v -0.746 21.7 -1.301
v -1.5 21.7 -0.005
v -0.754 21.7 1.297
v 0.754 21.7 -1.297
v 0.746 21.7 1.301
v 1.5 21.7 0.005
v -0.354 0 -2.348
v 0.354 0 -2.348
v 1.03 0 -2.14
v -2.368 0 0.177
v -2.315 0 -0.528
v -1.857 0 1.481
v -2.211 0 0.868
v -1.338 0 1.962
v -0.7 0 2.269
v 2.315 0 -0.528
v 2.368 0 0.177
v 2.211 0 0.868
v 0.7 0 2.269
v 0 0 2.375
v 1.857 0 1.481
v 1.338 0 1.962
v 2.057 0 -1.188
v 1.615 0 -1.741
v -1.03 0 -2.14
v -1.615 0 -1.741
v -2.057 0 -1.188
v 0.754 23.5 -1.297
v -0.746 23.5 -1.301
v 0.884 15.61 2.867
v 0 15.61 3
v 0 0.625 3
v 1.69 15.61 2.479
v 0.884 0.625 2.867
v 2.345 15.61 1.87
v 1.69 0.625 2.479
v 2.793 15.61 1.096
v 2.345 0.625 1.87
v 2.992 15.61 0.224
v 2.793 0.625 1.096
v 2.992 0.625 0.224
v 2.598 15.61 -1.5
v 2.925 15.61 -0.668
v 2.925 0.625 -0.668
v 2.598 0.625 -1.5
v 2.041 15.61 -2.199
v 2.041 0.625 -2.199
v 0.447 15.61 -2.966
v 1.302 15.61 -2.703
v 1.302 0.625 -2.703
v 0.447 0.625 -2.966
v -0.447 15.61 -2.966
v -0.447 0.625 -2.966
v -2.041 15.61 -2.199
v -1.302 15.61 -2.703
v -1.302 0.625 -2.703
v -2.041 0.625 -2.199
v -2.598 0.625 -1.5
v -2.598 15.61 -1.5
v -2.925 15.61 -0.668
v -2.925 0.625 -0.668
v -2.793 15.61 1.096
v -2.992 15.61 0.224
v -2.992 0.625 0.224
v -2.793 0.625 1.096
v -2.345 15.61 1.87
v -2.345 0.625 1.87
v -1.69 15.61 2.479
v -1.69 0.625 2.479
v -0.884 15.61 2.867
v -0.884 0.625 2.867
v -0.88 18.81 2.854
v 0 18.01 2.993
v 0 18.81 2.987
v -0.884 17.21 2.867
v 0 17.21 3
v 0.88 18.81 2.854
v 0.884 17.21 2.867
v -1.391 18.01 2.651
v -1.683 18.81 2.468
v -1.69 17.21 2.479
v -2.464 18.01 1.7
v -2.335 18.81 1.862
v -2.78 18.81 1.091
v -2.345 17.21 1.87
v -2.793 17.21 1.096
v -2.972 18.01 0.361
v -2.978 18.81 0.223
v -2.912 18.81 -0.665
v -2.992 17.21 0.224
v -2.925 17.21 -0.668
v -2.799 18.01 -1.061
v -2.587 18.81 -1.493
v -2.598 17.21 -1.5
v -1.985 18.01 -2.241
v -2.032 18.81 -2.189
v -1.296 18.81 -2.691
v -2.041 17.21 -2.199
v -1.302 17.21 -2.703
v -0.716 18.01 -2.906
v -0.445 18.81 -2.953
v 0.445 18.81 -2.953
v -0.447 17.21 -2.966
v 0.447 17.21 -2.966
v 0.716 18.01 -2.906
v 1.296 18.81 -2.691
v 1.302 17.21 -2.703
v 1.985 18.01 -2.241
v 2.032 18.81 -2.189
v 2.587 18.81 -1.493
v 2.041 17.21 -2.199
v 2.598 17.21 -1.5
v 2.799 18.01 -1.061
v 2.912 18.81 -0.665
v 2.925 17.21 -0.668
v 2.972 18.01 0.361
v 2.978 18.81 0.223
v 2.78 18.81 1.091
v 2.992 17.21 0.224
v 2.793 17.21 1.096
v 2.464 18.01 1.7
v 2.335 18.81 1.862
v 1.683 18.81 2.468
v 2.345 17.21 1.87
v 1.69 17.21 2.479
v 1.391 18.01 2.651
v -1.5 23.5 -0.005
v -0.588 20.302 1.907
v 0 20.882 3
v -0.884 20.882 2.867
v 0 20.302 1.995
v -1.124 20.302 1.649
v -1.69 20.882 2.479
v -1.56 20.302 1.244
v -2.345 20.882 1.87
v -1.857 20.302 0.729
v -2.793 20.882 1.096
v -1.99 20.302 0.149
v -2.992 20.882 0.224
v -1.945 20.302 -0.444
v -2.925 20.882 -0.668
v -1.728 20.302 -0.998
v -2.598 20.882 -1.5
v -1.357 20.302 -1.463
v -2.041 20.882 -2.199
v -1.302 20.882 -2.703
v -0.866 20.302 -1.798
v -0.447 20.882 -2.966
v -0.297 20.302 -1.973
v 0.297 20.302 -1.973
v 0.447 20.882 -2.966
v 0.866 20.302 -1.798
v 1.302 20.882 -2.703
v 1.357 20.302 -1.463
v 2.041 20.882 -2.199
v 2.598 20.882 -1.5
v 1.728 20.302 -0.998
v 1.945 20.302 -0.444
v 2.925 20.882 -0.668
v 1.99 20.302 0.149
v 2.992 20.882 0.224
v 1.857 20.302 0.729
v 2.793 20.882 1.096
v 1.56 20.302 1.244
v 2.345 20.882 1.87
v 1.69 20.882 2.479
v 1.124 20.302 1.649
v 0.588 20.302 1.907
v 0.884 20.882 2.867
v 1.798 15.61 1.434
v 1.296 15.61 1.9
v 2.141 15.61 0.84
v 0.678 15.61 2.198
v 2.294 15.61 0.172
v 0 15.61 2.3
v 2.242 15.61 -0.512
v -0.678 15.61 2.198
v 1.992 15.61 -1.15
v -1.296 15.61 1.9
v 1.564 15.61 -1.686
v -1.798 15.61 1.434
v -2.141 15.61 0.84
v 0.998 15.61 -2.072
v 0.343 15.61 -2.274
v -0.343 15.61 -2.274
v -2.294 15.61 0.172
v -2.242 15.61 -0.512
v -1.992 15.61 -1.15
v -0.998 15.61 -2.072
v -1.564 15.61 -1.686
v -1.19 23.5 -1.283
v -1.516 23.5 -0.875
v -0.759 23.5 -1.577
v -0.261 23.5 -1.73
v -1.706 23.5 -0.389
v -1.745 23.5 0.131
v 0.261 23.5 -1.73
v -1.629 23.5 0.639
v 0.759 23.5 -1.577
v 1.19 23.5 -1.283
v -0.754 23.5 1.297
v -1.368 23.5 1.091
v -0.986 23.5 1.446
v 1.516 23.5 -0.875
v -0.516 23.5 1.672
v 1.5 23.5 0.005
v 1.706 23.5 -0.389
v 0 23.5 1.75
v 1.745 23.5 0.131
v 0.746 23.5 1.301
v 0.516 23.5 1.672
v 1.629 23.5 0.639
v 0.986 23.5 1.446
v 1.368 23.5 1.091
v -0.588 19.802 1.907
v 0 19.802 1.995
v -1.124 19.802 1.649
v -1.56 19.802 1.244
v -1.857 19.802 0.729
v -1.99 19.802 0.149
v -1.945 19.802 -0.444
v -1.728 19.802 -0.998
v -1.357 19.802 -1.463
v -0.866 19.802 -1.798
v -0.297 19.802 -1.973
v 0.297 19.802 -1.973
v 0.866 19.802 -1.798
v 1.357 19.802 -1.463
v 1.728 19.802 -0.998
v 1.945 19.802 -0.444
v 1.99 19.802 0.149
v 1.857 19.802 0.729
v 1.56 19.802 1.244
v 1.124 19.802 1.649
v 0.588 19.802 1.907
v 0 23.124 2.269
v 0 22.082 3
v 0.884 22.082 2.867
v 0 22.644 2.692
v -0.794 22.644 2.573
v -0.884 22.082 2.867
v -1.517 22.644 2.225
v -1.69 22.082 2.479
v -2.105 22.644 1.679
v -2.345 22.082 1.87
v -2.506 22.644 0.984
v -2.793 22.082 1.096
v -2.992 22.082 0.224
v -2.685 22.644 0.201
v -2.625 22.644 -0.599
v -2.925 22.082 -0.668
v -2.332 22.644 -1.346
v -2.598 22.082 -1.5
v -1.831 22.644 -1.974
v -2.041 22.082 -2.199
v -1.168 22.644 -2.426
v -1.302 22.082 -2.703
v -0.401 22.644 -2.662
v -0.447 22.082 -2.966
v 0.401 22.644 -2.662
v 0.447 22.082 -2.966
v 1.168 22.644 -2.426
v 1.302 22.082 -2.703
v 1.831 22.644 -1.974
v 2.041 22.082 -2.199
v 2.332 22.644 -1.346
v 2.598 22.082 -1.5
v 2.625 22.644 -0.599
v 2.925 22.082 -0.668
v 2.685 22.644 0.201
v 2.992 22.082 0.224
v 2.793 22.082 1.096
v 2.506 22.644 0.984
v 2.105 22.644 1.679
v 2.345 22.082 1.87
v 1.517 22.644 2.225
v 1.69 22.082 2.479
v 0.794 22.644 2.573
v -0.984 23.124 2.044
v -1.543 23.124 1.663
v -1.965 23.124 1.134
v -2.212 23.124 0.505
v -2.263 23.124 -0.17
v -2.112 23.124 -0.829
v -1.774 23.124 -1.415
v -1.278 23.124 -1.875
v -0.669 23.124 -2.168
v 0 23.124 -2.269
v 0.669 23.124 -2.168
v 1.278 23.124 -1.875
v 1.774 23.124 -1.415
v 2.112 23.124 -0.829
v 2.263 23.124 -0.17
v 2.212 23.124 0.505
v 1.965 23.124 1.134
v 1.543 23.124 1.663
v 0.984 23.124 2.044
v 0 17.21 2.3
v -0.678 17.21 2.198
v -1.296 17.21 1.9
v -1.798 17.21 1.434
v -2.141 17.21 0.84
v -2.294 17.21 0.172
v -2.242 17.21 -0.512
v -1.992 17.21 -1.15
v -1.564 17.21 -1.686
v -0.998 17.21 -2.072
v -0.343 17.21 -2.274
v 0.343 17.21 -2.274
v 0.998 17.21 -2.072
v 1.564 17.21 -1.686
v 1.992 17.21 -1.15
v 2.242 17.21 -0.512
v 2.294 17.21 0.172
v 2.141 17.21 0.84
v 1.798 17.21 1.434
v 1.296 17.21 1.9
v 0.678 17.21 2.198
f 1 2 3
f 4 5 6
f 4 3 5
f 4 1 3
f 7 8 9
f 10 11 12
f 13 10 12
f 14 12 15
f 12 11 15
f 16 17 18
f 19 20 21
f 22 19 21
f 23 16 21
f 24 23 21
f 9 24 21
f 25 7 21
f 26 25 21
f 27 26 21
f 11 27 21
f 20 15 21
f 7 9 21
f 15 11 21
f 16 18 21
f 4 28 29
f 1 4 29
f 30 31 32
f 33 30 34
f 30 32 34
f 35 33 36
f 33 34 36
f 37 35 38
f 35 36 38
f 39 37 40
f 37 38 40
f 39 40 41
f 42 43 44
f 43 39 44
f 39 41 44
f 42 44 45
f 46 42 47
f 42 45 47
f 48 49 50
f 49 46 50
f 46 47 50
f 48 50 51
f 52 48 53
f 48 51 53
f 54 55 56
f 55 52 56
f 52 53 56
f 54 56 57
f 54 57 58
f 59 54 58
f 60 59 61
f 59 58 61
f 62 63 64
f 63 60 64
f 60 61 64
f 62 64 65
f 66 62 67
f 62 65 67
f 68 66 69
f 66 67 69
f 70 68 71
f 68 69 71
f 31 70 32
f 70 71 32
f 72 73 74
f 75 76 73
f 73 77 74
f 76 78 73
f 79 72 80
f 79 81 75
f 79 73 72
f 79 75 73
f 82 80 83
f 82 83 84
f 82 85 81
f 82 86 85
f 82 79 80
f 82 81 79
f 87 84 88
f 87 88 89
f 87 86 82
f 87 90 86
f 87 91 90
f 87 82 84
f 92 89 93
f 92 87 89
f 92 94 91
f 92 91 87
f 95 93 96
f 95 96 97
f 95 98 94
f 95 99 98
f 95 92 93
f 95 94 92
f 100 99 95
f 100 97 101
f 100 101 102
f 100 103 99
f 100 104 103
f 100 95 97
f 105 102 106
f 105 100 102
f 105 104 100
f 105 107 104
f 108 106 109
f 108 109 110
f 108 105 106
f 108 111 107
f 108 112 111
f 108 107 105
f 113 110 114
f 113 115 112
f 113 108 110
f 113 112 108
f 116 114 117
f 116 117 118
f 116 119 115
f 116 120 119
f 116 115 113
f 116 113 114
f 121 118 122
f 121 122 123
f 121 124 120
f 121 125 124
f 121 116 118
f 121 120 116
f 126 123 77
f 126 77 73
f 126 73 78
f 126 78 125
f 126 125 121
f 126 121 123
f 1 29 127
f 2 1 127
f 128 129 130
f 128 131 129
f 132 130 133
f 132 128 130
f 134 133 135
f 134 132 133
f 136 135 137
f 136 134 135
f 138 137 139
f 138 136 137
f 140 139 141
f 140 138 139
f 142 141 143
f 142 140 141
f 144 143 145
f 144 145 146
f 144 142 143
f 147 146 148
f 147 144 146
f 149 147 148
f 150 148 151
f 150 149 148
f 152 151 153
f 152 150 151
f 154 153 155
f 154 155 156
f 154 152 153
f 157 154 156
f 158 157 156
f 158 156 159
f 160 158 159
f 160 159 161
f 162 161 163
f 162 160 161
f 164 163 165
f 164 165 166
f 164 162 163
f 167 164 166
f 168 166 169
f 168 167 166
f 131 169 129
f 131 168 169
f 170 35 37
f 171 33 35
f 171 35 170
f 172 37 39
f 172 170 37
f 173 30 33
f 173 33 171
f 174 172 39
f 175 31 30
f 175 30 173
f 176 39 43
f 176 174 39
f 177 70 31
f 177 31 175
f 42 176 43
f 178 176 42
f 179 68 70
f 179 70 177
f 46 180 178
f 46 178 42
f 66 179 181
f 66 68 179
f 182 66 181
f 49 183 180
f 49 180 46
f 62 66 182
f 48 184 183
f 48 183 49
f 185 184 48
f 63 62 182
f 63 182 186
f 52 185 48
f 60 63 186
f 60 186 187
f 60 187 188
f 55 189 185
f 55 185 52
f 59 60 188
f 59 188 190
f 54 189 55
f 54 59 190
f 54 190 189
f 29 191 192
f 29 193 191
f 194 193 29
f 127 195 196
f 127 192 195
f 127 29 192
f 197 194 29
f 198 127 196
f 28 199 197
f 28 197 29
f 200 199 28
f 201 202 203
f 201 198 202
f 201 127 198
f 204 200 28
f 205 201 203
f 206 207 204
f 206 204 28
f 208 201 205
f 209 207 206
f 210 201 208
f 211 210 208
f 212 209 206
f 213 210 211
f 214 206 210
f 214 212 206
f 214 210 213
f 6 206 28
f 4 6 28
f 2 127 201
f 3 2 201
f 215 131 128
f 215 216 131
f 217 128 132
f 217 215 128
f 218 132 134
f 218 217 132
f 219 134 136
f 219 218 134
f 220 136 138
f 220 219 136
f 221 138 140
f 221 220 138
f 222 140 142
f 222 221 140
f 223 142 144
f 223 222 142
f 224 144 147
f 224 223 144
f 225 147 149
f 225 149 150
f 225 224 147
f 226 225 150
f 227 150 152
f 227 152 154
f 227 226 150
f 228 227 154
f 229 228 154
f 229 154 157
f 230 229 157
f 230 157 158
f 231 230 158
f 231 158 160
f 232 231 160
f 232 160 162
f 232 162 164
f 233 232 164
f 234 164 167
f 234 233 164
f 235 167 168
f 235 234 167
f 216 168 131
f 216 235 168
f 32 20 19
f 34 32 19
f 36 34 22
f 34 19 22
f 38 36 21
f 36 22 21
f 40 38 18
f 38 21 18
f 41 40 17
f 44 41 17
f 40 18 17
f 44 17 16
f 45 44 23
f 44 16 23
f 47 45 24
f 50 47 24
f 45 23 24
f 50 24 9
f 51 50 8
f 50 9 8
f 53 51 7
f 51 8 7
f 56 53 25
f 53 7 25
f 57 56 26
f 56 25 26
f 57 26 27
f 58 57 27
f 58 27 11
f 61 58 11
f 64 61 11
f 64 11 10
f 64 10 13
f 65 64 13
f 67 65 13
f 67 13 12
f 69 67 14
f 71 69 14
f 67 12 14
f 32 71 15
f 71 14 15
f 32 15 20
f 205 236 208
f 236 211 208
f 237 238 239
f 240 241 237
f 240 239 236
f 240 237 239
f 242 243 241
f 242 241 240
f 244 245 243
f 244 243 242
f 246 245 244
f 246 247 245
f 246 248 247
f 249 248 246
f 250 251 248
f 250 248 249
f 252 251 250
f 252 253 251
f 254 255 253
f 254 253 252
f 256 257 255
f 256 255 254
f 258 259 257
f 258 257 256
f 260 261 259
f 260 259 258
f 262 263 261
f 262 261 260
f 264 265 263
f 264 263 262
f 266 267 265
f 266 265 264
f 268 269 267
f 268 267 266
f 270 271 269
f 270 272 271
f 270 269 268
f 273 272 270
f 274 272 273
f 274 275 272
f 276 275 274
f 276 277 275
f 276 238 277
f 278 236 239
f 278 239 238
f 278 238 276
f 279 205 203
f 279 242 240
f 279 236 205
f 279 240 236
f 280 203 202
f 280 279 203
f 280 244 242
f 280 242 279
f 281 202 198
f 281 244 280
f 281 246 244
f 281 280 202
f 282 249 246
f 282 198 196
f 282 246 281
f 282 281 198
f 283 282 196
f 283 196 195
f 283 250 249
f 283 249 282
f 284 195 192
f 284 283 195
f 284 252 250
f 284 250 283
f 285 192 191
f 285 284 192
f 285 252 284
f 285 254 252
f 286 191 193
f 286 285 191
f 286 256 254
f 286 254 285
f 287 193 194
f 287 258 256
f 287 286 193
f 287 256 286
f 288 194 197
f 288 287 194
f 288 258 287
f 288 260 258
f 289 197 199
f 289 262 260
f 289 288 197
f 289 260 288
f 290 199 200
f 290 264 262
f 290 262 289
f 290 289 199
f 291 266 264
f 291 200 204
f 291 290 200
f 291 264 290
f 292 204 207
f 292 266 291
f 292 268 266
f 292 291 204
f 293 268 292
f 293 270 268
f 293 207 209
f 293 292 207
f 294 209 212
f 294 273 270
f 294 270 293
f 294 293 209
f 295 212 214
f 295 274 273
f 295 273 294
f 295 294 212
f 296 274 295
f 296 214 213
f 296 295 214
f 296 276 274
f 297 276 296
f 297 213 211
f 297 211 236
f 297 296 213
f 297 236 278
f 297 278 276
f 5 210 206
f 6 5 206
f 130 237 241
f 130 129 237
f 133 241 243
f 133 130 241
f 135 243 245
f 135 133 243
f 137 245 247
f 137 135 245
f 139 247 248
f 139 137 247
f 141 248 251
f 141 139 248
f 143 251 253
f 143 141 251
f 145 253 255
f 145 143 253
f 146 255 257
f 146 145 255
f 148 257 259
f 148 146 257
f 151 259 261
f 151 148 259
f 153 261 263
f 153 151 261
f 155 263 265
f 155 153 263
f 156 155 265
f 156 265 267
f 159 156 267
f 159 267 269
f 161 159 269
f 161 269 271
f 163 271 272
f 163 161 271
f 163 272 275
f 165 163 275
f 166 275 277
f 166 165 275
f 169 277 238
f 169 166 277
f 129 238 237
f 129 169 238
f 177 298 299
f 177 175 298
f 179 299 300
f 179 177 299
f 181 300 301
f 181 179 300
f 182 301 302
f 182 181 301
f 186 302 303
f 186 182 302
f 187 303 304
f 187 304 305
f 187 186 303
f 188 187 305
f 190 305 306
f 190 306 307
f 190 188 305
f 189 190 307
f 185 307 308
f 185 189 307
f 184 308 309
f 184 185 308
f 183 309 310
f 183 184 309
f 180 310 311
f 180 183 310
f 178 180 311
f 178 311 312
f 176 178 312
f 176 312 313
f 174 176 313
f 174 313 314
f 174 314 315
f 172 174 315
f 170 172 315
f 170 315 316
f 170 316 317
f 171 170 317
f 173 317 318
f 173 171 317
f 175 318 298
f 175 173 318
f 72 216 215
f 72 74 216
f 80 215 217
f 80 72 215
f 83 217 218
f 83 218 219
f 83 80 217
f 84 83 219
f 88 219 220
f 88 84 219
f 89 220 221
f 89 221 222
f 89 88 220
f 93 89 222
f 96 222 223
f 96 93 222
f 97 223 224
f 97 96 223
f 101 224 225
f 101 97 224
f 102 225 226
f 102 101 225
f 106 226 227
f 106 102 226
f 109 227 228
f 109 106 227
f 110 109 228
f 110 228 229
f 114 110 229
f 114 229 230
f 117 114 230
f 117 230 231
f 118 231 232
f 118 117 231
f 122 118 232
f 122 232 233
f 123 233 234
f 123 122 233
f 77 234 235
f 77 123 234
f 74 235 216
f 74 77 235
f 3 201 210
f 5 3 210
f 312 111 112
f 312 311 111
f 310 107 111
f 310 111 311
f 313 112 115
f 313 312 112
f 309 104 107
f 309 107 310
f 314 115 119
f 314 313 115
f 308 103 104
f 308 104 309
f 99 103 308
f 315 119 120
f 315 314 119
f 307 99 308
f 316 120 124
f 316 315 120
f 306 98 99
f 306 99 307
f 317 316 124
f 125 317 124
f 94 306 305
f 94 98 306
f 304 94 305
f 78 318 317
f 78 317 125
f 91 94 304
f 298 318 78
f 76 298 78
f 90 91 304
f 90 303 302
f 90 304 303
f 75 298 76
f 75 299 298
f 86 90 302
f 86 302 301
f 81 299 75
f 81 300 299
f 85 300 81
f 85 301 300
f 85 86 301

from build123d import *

# Parameters (mm, degrees)
SKETCH1_R           = 3
BOSS_EXTRUDE1_DEPTH = 23.5
CHAMFER1_SIZE       = 0.625
CUT_EXTRUDE1_DEPTH  = 1.8


with BuildPart() as part:
    # Sketch1 → Boss-Extrude1 (new body)
    with BuildSketch(Plane(origin=(0, 0, 0), x_dir=(1, 0, 0), z_dir=(0, 1, 0))):
        with Locations(Location((0, 0, 0), (0, 0, 270))):
            Circle(SKETCH1_R)
    extrude(amount=BOSS_EXTRUDE1_DEPTH)

    # Sketch2 → Cut-Revolve1 (revolve, cut)
    with BuildSketch(Plane.XY, mode=Mode.PRIVATE) as cut_revolve1_sk:
        with BuildLine():
            Line((3, 22.081556921), (3, 20.881556921))
            Line((3, 20.881556921), (1.995368836, 20.301532848))
            Line((1.995368836, 20.301532848), (1.995368836, 19.801532848))
            Line((1.995368836, 19.801532848), (2.986803407, 18.810098278))
            Line((2.986803407, 18.810098278), (3, 17.210098278))
            Line((3, 17.210098278), (2.3, 17.210098278))
            Line((2.3, 17.210098278), (2.3, 15.610098278))
            Line((2.3, 15.610098278), (3, 15.610098278))
            Line((3, 15.610098278), (5.142193945, 15.610098278))
            Line((5.142193945, 15.610098278), (5.142193945, 23.5))
            Line((5.142193945, 23.5), (1.75, 23.5))
            ThreePointArc((1.75, 23.5), (2.493968727, 22.895619403), (3, 22.081556921))
        make_face()
    revolve(cut_revolve1_sk.sketch.rotate(Axis((0, 23.5, 0), (0, -1, 0)), 90), axis=Axis((0, 23.5, 0), (0, -1, 0)), mode=Mode.SUBTRACT)

    # Chamfer1
    chamfer1_edges = [part.edges().sort_by_distance(p)[0] for p in [
        (0, 0, -3),
    ]]
    chamfer(chamfer1_edges, length=CHAMFER1_SIZE)

    # Sketch3 → Cut-Extrude1 (cut)
    with BuildSketch(Plane(origin=(0, 23.5, 0), x_dir=(1, 0, 0), z_dir=(0, 1, 0))):
        Polygon((0.745992991, -1.301343328), (1.499992877, -0.004622783), (0.753999886, 1.296720545), (-0.745992991, 1.301343328), (-1.499992877, 0.004622783), (-0.753999886, -1.296720545), align=None)
    extrude(amount=-CUT_EXTRUDE1_DEPTH, mode=Mode.SUBTRACT)


solid = part.part
